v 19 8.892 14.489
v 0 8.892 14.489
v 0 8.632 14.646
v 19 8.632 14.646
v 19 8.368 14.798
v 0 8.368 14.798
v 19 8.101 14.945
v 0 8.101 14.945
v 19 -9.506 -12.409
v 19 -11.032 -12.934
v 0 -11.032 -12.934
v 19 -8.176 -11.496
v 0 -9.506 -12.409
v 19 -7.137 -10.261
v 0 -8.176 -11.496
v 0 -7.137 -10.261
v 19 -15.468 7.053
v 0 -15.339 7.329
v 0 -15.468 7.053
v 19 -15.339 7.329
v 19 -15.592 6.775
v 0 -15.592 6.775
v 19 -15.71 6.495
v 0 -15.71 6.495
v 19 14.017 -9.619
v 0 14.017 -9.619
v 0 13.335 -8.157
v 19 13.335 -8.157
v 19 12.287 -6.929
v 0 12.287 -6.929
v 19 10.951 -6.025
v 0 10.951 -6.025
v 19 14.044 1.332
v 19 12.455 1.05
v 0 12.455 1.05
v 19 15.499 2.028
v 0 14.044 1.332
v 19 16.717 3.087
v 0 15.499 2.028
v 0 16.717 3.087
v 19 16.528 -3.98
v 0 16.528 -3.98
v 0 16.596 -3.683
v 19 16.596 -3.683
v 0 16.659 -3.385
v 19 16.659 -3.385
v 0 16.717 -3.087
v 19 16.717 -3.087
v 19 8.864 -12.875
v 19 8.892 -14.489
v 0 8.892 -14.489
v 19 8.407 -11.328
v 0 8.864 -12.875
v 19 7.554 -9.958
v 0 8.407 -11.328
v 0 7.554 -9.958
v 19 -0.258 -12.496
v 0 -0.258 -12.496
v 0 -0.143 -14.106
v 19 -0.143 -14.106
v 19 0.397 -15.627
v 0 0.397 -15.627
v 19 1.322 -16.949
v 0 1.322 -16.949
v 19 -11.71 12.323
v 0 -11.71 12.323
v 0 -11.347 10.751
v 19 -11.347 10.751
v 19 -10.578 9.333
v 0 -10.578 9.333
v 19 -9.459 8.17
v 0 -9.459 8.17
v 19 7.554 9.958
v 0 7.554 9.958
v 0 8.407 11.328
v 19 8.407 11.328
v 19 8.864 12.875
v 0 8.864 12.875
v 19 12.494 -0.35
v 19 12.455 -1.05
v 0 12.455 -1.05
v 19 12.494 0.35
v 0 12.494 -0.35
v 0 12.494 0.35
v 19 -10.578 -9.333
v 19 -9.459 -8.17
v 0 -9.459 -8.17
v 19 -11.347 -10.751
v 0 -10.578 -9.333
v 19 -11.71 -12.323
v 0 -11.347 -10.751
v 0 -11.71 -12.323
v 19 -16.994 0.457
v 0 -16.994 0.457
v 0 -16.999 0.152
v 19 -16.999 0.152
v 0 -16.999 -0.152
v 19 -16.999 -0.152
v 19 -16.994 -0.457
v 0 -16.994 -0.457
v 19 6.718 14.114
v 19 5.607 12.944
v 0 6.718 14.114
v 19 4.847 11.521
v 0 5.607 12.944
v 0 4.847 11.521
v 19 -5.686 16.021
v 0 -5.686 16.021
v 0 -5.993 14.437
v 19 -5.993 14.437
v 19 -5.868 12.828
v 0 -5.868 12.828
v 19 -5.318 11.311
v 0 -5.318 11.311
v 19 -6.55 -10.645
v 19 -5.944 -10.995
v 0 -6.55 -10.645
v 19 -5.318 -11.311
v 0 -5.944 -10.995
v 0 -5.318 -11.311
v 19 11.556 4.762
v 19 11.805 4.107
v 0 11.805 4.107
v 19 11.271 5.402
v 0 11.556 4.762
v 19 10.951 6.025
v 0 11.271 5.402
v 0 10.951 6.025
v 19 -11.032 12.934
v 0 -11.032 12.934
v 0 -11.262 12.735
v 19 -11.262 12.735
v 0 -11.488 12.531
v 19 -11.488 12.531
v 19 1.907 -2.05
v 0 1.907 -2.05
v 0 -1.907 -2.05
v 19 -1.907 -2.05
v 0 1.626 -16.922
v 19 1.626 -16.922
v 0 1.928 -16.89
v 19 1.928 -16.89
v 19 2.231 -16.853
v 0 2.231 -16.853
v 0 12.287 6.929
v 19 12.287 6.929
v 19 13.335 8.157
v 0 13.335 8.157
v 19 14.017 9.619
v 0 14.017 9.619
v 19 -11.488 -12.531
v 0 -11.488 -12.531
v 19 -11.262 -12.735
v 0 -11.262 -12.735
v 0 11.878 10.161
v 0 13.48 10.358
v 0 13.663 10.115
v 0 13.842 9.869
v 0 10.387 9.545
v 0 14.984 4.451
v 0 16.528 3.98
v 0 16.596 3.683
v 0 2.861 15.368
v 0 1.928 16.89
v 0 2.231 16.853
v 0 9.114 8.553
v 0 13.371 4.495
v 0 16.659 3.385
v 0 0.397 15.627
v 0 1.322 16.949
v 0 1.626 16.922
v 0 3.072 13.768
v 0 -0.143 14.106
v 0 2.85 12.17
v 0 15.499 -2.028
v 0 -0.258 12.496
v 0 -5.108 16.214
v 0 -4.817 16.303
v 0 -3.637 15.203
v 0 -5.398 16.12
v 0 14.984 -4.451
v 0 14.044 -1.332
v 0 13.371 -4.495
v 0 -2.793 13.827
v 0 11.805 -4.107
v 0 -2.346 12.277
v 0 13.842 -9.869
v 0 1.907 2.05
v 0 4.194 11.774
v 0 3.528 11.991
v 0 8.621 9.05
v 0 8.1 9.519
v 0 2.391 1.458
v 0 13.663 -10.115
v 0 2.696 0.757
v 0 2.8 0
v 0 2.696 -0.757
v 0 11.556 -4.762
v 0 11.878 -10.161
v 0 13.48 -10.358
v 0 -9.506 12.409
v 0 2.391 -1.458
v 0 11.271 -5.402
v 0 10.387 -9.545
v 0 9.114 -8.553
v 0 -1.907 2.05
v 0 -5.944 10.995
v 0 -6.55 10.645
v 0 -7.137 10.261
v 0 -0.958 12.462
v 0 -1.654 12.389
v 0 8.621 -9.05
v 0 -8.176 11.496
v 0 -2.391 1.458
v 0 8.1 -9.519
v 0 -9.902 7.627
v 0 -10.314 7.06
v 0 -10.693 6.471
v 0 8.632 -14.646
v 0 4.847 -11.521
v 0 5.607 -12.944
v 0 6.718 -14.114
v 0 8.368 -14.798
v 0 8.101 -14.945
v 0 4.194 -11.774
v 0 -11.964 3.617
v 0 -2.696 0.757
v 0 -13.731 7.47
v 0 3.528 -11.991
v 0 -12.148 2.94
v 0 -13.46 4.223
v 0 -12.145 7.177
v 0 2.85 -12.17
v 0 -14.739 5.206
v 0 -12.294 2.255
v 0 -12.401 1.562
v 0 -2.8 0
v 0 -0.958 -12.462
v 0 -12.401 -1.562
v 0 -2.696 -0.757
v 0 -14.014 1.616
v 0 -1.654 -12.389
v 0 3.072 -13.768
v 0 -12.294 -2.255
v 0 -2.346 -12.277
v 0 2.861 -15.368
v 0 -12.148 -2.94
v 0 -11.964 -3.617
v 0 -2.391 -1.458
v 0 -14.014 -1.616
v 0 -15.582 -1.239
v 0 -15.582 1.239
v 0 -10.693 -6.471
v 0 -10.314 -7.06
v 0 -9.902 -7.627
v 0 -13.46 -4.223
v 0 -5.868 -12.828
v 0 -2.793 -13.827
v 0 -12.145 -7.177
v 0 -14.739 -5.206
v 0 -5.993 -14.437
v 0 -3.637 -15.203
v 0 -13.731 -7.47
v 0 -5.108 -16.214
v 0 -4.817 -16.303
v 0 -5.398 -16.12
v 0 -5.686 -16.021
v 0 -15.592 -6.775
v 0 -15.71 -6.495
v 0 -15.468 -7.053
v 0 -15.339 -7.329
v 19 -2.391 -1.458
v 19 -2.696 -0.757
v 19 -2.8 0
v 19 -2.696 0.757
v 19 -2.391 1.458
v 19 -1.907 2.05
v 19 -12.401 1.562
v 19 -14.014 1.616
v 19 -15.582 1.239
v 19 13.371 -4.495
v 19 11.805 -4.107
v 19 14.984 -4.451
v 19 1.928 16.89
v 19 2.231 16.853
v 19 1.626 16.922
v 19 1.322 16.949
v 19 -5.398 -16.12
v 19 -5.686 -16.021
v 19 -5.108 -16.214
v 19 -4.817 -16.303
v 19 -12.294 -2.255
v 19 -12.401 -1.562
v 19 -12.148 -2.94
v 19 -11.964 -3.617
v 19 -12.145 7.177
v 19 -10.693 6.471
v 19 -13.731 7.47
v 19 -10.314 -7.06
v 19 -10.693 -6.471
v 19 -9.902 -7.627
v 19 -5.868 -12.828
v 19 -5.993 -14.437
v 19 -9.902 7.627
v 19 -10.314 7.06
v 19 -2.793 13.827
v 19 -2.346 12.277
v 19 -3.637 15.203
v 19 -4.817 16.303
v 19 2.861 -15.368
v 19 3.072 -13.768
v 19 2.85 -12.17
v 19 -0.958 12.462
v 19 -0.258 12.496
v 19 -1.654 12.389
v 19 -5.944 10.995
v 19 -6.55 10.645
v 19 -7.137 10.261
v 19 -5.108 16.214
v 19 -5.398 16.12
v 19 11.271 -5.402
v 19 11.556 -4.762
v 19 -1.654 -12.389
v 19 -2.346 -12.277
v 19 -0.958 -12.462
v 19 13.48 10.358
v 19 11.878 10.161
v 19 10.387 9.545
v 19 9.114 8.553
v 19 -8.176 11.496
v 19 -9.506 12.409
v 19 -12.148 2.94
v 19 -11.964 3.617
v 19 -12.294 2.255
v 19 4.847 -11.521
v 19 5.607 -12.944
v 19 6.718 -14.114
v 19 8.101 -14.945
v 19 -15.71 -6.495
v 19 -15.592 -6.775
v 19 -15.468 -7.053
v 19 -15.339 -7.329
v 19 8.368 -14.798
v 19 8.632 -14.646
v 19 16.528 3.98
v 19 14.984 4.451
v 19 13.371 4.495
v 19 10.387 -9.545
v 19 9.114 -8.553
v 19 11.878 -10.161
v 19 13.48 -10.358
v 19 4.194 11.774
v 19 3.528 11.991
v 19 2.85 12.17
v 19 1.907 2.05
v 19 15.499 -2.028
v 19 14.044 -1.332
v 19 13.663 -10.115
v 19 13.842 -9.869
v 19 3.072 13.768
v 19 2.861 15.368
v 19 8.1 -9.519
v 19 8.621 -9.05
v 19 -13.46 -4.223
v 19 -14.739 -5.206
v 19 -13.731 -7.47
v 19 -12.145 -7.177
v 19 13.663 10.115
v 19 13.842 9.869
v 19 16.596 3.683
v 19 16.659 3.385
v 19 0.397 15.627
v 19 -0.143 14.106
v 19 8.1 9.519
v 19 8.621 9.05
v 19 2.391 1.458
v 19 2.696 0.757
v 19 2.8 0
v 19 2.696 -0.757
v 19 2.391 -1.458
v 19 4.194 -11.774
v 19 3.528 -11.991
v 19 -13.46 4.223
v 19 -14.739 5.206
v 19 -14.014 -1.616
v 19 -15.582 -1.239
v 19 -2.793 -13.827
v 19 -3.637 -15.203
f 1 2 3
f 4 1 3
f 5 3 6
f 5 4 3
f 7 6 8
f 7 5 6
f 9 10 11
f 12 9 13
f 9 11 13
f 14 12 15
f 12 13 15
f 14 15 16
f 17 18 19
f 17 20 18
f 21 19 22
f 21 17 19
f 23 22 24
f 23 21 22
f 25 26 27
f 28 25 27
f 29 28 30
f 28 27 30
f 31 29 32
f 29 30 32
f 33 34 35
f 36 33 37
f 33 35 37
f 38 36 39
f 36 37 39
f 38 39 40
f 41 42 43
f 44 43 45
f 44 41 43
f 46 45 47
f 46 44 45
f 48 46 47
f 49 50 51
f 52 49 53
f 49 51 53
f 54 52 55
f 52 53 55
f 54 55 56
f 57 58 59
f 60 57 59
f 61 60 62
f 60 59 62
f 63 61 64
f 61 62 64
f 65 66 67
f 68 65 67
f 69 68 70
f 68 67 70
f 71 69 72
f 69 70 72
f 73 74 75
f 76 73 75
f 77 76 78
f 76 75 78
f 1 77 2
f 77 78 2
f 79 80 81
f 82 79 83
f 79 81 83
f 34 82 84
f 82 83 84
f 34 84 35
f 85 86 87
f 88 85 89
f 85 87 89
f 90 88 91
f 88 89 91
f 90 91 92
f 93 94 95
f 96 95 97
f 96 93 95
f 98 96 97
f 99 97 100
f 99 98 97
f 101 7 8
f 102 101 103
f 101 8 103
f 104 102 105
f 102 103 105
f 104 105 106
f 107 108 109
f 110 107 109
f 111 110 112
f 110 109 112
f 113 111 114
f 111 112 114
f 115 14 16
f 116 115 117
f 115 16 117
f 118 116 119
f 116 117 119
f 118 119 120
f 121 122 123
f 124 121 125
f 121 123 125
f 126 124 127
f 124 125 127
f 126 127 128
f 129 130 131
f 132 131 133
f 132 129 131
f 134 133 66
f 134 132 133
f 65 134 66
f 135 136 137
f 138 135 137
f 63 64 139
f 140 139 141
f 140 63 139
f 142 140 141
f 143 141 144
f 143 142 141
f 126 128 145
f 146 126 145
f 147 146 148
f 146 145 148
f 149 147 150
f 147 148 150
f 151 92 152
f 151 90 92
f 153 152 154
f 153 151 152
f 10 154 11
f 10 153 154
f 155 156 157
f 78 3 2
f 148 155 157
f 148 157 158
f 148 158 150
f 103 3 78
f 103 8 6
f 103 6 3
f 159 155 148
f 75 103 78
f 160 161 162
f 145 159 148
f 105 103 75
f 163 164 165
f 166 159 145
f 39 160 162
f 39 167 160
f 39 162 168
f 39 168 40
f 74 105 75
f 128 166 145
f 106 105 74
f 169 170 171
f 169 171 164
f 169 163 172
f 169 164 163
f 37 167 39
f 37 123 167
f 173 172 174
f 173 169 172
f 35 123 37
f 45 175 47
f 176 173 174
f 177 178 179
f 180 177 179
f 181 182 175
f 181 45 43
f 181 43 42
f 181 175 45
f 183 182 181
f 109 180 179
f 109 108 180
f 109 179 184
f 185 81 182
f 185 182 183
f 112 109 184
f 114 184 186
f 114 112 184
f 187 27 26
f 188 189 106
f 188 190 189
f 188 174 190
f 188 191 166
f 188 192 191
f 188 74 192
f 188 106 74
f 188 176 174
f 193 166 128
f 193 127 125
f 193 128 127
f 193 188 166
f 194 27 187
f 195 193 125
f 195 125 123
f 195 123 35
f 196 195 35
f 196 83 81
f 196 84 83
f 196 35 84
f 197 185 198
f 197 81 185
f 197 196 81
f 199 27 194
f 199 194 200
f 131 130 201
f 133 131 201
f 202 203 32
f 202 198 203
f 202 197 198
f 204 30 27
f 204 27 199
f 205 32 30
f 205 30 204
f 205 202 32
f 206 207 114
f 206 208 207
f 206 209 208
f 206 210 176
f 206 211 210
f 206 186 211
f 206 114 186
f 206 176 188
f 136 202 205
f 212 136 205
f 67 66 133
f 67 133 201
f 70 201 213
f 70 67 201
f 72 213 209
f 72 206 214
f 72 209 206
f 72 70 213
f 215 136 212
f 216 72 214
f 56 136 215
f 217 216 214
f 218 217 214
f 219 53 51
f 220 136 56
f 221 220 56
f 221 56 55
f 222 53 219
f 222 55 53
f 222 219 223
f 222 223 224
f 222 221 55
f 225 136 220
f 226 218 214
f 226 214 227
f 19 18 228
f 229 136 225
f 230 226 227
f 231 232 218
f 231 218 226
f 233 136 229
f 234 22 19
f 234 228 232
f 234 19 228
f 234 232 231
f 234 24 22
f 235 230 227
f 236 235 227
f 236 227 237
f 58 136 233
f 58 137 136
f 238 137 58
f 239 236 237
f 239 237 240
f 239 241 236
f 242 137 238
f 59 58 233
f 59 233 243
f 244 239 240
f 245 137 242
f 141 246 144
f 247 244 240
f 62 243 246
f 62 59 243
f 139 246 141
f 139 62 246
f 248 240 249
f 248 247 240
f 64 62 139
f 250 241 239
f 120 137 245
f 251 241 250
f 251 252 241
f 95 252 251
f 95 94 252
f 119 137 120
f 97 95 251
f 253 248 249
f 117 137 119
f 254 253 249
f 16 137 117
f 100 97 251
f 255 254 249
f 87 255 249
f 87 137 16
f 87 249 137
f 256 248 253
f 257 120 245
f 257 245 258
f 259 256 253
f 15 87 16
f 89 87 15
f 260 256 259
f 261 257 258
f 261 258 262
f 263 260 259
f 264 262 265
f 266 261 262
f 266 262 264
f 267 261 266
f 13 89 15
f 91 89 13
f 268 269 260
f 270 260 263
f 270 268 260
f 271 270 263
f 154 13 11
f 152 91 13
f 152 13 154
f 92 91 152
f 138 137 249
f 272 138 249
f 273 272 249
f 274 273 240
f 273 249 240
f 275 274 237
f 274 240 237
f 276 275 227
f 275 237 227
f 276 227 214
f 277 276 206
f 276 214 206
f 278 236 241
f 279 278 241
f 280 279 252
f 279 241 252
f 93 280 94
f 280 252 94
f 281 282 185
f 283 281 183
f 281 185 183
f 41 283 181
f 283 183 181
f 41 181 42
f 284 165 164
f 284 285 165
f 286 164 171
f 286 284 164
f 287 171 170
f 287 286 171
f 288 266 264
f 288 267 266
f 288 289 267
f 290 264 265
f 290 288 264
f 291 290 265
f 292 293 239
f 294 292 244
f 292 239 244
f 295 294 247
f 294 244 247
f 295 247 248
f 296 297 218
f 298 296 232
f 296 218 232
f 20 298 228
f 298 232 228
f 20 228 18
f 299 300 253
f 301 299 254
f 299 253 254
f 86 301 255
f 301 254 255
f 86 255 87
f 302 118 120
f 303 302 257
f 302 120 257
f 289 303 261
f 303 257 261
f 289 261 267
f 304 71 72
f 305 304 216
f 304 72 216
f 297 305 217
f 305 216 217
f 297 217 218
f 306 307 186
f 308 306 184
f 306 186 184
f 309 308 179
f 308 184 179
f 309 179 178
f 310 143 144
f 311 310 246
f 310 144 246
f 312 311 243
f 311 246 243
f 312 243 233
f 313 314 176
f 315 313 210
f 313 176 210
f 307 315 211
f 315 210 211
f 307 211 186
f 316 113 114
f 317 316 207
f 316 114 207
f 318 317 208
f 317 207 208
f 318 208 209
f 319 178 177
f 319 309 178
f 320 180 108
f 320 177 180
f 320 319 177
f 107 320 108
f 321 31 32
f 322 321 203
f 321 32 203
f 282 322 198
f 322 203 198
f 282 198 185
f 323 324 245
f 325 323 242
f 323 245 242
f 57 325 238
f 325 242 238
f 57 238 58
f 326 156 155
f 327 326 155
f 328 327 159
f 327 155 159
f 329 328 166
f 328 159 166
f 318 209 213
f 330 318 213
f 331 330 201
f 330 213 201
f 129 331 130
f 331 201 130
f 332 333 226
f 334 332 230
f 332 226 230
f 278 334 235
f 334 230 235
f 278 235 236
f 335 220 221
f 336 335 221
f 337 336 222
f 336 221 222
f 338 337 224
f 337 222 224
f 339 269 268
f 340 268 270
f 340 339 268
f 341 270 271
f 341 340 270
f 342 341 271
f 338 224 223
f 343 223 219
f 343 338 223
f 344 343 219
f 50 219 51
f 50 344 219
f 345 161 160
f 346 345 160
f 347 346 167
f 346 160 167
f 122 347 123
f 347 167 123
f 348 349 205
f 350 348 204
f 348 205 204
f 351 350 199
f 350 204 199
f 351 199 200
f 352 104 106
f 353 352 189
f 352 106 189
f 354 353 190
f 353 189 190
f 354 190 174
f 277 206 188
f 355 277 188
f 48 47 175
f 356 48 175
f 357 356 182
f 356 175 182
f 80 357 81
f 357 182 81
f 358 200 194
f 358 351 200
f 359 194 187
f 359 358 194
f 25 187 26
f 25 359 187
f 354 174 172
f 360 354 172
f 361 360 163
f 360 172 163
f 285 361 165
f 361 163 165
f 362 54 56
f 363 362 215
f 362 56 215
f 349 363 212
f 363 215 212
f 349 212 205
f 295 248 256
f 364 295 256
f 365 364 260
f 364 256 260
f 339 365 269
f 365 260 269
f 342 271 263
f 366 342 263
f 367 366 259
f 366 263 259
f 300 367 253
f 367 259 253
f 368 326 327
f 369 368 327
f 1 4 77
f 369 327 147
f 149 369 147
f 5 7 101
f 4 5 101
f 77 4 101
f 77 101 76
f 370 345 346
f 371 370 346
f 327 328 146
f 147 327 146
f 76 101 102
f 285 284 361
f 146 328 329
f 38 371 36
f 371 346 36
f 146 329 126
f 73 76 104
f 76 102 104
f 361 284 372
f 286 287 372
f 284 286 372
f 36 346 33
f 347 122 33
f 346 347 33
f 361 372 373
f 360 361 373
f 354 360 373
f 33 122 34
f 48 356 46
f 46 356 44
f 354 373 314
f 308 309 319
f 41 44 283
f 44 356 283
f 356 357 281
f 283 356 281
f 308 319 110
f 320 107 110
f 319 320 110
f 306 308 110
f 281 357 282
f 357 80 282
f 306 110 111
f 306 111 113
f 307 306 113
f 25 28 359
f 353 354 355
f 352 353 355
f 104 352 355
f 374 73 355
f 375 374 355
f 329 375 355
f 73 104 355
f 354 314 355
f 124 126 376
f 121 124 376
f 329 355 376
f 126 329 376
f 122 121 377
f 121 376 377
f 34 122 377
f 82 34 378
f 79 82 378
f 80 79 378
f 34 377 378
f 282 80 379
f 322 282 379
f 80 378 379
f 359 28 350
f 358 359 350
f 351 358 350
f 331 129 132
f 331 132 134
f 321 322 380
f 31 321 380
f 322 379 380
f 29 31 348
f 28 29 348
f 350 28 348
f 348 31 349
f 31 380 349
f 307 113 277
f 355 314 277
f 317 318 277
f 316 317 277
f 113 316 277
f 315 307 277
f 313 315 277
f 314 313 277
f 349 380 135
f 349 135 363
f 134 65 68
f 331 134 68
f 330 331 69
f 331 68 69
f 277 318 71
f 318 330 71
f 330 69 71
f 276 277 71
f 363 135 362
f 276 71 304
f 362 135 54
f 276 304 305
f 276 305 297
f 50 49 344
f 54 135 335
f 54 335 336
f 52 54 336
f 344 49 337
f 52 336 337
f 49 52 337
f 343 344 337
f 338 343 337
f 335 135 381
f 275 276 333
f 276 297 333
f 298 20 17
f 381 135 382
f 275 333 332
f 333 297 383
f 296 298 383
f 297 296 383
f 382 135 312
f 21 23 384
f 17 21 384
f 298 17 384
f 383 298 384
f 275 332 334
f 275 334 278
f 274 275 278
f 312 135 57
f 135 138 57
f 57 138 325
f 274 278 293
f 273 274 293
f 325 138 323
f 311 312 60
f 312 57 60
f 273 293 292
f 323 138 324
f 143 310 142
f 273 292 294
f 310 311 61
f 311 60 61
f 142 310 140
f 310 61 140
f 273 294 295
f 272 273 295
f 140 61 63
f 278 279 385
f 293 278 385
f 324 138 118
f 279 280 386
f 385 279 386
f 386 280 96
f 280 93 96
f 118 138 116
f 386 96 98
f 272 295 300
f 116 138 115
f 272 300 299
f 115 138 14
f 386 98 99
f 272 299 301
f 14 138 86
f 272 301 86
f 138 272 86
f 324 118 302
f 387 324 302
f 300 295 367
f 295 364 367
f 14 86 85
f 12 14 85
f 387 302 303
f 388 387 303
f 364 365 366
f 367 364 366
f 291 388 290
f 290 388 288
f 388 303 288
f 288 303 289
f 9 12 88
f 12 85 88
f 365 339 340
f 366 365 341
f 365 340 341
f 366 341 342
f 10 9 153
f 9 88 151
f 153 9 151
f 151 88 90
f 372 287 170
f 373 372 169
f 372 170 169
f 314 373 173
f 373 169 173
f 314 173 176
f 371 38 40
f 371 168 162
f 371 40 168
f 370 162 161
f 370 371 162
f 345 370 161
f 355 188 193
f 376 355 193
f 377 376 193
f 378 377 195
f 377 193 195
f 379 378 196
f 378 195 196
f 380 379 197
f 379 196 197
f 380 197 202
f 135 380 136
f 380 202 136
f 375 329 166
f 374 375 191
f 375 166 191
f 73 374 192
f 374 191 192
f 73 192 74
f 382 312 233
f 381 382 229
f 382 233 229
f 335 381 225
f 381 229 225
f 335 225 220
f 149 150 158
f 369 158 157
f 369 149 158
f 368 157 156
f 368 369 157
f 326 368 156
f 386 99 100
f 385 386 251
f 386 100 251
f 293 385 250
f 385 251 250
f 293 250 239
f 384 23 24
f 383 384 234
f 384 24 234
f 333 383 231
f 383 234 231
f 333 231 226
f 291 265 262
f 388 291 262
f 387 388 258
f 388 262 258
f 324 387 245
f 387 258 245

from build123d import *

# Parameters (mm, degrees)
BASPROSKE_W        = 19
BASPROSKE_H        = 17
TOOTHCUT_DEPTH     = 31.643106892
TEETHCUTS_COUNT    = 15
TEETHCUTS_ANGLE    = 336
BORSKE_R           = 0.4
BORE_DEPTH         = 50.0000508
CUT_EXTRUDE1_REACH = 32.615


with BuildPart() as part:
    # BasProSke → Base-Revolve (revolve)
    with BuildSketch(Plane(origin=(0, 0, 0), x_dir=(1, 0, 0), z_dir=(0, 1, 0)), mode=Mode.PRIVATE) as base_revolve_sk:
        with Locations((9.5, 8.5)):
            Rectangle(BASPROSKE_W, BASPROSKE_H)
    revolve(base_revolve_sk.sketch.rotate(Axis((-10, 0, 0), (1, 0, 0)), 180), axis=Axis((-10, 0, 0), (1, 0, 0)))

    # TooCutSke → ToothCut (cut, through all)
    with BuildSketch(Plane(origin=(0, 0, 0), x_dir=(0, 0, -1), z_dir=(1, 0, 0))):
        with BuildLine():
            ThreePointArc((1.050056448, 12.454813626), (0, 12.499), (-1.050056448, 12.454813626))
            ThreePointArc((-1.050056448, 12.454813626), (-1.638118106, 14.809604533), (-3.110934279, 16.73876737))
            ThreePointArc((-3.110934279, 16.73876737), (0, 17.0254), (3.110934279, 16.73876737))
            ThreePointArc((3.110934279, 16.73876737), (1.638118106, 14.809604533), (1.050056448, 12.454813626))
        make_face()
    toothcut = extrude(amount=TOOTHCUT_DEPTH, mode=Mode.SUBTRACT)

    # TeethCuts: ToothCut ×15 about axis
    teethcuts_axis = Axis((-10, 0, 0), (1, 0, 0))
    for i in range(1, TEETHCUTS_COUNT):
        add(toothcut.rotate(teethcuts_axis, i * TEETHCUTS_ANGLE / (TEETHCUTS_COUNT - 1)), mode=Mode.SUBTRACT)

    # BorSke → Bore (cut, symmetric)
    with BuildSketch(Plane(origin=(0, 0, 0), x_dir=(0, 0, -1), z_dir=(1, 0, 0))):
        with Locations(Location((0, 0, 0), (0, 0, 180))):
            Circle(BORSKE_R)
    extrude(amount=BORE_DEPTH, both=True, mode=Mode.SUBTRACT)

    # Sketch1 → Cut-Extrude1 (cut, up to next)
    with BuildSketch(Plane.ZY, mode=Mode.PRIVATE) as cut_extrude1_sk1:
        with BuildLine():
            Line((2.05, -1.907223112), (2.05, 1.907223112))
            ThreePointArc((2.05, 1.907223112), (0, 2.8), (-2.05, 1.907223112))
            Line((-2.05, 1.907223112), (-2.05, -1.907223112))
            ThreePointArc((-2.05, -1.907223112), (0, -2.8), (2.05, -1.907223112))
        make_face()
    cut_extrude1_tool1 = extrude(cut_extrude1_sk1.sketch, amount=-CUT_EXTRUDE1_REACH, mode=Mode.PRIVATE) & part.part
    add(cut_extrude1_tool1.solids().sort_by_distance((0, 0, 0))[0], mode=Mode.SUBTRACT)


solid = part.part
